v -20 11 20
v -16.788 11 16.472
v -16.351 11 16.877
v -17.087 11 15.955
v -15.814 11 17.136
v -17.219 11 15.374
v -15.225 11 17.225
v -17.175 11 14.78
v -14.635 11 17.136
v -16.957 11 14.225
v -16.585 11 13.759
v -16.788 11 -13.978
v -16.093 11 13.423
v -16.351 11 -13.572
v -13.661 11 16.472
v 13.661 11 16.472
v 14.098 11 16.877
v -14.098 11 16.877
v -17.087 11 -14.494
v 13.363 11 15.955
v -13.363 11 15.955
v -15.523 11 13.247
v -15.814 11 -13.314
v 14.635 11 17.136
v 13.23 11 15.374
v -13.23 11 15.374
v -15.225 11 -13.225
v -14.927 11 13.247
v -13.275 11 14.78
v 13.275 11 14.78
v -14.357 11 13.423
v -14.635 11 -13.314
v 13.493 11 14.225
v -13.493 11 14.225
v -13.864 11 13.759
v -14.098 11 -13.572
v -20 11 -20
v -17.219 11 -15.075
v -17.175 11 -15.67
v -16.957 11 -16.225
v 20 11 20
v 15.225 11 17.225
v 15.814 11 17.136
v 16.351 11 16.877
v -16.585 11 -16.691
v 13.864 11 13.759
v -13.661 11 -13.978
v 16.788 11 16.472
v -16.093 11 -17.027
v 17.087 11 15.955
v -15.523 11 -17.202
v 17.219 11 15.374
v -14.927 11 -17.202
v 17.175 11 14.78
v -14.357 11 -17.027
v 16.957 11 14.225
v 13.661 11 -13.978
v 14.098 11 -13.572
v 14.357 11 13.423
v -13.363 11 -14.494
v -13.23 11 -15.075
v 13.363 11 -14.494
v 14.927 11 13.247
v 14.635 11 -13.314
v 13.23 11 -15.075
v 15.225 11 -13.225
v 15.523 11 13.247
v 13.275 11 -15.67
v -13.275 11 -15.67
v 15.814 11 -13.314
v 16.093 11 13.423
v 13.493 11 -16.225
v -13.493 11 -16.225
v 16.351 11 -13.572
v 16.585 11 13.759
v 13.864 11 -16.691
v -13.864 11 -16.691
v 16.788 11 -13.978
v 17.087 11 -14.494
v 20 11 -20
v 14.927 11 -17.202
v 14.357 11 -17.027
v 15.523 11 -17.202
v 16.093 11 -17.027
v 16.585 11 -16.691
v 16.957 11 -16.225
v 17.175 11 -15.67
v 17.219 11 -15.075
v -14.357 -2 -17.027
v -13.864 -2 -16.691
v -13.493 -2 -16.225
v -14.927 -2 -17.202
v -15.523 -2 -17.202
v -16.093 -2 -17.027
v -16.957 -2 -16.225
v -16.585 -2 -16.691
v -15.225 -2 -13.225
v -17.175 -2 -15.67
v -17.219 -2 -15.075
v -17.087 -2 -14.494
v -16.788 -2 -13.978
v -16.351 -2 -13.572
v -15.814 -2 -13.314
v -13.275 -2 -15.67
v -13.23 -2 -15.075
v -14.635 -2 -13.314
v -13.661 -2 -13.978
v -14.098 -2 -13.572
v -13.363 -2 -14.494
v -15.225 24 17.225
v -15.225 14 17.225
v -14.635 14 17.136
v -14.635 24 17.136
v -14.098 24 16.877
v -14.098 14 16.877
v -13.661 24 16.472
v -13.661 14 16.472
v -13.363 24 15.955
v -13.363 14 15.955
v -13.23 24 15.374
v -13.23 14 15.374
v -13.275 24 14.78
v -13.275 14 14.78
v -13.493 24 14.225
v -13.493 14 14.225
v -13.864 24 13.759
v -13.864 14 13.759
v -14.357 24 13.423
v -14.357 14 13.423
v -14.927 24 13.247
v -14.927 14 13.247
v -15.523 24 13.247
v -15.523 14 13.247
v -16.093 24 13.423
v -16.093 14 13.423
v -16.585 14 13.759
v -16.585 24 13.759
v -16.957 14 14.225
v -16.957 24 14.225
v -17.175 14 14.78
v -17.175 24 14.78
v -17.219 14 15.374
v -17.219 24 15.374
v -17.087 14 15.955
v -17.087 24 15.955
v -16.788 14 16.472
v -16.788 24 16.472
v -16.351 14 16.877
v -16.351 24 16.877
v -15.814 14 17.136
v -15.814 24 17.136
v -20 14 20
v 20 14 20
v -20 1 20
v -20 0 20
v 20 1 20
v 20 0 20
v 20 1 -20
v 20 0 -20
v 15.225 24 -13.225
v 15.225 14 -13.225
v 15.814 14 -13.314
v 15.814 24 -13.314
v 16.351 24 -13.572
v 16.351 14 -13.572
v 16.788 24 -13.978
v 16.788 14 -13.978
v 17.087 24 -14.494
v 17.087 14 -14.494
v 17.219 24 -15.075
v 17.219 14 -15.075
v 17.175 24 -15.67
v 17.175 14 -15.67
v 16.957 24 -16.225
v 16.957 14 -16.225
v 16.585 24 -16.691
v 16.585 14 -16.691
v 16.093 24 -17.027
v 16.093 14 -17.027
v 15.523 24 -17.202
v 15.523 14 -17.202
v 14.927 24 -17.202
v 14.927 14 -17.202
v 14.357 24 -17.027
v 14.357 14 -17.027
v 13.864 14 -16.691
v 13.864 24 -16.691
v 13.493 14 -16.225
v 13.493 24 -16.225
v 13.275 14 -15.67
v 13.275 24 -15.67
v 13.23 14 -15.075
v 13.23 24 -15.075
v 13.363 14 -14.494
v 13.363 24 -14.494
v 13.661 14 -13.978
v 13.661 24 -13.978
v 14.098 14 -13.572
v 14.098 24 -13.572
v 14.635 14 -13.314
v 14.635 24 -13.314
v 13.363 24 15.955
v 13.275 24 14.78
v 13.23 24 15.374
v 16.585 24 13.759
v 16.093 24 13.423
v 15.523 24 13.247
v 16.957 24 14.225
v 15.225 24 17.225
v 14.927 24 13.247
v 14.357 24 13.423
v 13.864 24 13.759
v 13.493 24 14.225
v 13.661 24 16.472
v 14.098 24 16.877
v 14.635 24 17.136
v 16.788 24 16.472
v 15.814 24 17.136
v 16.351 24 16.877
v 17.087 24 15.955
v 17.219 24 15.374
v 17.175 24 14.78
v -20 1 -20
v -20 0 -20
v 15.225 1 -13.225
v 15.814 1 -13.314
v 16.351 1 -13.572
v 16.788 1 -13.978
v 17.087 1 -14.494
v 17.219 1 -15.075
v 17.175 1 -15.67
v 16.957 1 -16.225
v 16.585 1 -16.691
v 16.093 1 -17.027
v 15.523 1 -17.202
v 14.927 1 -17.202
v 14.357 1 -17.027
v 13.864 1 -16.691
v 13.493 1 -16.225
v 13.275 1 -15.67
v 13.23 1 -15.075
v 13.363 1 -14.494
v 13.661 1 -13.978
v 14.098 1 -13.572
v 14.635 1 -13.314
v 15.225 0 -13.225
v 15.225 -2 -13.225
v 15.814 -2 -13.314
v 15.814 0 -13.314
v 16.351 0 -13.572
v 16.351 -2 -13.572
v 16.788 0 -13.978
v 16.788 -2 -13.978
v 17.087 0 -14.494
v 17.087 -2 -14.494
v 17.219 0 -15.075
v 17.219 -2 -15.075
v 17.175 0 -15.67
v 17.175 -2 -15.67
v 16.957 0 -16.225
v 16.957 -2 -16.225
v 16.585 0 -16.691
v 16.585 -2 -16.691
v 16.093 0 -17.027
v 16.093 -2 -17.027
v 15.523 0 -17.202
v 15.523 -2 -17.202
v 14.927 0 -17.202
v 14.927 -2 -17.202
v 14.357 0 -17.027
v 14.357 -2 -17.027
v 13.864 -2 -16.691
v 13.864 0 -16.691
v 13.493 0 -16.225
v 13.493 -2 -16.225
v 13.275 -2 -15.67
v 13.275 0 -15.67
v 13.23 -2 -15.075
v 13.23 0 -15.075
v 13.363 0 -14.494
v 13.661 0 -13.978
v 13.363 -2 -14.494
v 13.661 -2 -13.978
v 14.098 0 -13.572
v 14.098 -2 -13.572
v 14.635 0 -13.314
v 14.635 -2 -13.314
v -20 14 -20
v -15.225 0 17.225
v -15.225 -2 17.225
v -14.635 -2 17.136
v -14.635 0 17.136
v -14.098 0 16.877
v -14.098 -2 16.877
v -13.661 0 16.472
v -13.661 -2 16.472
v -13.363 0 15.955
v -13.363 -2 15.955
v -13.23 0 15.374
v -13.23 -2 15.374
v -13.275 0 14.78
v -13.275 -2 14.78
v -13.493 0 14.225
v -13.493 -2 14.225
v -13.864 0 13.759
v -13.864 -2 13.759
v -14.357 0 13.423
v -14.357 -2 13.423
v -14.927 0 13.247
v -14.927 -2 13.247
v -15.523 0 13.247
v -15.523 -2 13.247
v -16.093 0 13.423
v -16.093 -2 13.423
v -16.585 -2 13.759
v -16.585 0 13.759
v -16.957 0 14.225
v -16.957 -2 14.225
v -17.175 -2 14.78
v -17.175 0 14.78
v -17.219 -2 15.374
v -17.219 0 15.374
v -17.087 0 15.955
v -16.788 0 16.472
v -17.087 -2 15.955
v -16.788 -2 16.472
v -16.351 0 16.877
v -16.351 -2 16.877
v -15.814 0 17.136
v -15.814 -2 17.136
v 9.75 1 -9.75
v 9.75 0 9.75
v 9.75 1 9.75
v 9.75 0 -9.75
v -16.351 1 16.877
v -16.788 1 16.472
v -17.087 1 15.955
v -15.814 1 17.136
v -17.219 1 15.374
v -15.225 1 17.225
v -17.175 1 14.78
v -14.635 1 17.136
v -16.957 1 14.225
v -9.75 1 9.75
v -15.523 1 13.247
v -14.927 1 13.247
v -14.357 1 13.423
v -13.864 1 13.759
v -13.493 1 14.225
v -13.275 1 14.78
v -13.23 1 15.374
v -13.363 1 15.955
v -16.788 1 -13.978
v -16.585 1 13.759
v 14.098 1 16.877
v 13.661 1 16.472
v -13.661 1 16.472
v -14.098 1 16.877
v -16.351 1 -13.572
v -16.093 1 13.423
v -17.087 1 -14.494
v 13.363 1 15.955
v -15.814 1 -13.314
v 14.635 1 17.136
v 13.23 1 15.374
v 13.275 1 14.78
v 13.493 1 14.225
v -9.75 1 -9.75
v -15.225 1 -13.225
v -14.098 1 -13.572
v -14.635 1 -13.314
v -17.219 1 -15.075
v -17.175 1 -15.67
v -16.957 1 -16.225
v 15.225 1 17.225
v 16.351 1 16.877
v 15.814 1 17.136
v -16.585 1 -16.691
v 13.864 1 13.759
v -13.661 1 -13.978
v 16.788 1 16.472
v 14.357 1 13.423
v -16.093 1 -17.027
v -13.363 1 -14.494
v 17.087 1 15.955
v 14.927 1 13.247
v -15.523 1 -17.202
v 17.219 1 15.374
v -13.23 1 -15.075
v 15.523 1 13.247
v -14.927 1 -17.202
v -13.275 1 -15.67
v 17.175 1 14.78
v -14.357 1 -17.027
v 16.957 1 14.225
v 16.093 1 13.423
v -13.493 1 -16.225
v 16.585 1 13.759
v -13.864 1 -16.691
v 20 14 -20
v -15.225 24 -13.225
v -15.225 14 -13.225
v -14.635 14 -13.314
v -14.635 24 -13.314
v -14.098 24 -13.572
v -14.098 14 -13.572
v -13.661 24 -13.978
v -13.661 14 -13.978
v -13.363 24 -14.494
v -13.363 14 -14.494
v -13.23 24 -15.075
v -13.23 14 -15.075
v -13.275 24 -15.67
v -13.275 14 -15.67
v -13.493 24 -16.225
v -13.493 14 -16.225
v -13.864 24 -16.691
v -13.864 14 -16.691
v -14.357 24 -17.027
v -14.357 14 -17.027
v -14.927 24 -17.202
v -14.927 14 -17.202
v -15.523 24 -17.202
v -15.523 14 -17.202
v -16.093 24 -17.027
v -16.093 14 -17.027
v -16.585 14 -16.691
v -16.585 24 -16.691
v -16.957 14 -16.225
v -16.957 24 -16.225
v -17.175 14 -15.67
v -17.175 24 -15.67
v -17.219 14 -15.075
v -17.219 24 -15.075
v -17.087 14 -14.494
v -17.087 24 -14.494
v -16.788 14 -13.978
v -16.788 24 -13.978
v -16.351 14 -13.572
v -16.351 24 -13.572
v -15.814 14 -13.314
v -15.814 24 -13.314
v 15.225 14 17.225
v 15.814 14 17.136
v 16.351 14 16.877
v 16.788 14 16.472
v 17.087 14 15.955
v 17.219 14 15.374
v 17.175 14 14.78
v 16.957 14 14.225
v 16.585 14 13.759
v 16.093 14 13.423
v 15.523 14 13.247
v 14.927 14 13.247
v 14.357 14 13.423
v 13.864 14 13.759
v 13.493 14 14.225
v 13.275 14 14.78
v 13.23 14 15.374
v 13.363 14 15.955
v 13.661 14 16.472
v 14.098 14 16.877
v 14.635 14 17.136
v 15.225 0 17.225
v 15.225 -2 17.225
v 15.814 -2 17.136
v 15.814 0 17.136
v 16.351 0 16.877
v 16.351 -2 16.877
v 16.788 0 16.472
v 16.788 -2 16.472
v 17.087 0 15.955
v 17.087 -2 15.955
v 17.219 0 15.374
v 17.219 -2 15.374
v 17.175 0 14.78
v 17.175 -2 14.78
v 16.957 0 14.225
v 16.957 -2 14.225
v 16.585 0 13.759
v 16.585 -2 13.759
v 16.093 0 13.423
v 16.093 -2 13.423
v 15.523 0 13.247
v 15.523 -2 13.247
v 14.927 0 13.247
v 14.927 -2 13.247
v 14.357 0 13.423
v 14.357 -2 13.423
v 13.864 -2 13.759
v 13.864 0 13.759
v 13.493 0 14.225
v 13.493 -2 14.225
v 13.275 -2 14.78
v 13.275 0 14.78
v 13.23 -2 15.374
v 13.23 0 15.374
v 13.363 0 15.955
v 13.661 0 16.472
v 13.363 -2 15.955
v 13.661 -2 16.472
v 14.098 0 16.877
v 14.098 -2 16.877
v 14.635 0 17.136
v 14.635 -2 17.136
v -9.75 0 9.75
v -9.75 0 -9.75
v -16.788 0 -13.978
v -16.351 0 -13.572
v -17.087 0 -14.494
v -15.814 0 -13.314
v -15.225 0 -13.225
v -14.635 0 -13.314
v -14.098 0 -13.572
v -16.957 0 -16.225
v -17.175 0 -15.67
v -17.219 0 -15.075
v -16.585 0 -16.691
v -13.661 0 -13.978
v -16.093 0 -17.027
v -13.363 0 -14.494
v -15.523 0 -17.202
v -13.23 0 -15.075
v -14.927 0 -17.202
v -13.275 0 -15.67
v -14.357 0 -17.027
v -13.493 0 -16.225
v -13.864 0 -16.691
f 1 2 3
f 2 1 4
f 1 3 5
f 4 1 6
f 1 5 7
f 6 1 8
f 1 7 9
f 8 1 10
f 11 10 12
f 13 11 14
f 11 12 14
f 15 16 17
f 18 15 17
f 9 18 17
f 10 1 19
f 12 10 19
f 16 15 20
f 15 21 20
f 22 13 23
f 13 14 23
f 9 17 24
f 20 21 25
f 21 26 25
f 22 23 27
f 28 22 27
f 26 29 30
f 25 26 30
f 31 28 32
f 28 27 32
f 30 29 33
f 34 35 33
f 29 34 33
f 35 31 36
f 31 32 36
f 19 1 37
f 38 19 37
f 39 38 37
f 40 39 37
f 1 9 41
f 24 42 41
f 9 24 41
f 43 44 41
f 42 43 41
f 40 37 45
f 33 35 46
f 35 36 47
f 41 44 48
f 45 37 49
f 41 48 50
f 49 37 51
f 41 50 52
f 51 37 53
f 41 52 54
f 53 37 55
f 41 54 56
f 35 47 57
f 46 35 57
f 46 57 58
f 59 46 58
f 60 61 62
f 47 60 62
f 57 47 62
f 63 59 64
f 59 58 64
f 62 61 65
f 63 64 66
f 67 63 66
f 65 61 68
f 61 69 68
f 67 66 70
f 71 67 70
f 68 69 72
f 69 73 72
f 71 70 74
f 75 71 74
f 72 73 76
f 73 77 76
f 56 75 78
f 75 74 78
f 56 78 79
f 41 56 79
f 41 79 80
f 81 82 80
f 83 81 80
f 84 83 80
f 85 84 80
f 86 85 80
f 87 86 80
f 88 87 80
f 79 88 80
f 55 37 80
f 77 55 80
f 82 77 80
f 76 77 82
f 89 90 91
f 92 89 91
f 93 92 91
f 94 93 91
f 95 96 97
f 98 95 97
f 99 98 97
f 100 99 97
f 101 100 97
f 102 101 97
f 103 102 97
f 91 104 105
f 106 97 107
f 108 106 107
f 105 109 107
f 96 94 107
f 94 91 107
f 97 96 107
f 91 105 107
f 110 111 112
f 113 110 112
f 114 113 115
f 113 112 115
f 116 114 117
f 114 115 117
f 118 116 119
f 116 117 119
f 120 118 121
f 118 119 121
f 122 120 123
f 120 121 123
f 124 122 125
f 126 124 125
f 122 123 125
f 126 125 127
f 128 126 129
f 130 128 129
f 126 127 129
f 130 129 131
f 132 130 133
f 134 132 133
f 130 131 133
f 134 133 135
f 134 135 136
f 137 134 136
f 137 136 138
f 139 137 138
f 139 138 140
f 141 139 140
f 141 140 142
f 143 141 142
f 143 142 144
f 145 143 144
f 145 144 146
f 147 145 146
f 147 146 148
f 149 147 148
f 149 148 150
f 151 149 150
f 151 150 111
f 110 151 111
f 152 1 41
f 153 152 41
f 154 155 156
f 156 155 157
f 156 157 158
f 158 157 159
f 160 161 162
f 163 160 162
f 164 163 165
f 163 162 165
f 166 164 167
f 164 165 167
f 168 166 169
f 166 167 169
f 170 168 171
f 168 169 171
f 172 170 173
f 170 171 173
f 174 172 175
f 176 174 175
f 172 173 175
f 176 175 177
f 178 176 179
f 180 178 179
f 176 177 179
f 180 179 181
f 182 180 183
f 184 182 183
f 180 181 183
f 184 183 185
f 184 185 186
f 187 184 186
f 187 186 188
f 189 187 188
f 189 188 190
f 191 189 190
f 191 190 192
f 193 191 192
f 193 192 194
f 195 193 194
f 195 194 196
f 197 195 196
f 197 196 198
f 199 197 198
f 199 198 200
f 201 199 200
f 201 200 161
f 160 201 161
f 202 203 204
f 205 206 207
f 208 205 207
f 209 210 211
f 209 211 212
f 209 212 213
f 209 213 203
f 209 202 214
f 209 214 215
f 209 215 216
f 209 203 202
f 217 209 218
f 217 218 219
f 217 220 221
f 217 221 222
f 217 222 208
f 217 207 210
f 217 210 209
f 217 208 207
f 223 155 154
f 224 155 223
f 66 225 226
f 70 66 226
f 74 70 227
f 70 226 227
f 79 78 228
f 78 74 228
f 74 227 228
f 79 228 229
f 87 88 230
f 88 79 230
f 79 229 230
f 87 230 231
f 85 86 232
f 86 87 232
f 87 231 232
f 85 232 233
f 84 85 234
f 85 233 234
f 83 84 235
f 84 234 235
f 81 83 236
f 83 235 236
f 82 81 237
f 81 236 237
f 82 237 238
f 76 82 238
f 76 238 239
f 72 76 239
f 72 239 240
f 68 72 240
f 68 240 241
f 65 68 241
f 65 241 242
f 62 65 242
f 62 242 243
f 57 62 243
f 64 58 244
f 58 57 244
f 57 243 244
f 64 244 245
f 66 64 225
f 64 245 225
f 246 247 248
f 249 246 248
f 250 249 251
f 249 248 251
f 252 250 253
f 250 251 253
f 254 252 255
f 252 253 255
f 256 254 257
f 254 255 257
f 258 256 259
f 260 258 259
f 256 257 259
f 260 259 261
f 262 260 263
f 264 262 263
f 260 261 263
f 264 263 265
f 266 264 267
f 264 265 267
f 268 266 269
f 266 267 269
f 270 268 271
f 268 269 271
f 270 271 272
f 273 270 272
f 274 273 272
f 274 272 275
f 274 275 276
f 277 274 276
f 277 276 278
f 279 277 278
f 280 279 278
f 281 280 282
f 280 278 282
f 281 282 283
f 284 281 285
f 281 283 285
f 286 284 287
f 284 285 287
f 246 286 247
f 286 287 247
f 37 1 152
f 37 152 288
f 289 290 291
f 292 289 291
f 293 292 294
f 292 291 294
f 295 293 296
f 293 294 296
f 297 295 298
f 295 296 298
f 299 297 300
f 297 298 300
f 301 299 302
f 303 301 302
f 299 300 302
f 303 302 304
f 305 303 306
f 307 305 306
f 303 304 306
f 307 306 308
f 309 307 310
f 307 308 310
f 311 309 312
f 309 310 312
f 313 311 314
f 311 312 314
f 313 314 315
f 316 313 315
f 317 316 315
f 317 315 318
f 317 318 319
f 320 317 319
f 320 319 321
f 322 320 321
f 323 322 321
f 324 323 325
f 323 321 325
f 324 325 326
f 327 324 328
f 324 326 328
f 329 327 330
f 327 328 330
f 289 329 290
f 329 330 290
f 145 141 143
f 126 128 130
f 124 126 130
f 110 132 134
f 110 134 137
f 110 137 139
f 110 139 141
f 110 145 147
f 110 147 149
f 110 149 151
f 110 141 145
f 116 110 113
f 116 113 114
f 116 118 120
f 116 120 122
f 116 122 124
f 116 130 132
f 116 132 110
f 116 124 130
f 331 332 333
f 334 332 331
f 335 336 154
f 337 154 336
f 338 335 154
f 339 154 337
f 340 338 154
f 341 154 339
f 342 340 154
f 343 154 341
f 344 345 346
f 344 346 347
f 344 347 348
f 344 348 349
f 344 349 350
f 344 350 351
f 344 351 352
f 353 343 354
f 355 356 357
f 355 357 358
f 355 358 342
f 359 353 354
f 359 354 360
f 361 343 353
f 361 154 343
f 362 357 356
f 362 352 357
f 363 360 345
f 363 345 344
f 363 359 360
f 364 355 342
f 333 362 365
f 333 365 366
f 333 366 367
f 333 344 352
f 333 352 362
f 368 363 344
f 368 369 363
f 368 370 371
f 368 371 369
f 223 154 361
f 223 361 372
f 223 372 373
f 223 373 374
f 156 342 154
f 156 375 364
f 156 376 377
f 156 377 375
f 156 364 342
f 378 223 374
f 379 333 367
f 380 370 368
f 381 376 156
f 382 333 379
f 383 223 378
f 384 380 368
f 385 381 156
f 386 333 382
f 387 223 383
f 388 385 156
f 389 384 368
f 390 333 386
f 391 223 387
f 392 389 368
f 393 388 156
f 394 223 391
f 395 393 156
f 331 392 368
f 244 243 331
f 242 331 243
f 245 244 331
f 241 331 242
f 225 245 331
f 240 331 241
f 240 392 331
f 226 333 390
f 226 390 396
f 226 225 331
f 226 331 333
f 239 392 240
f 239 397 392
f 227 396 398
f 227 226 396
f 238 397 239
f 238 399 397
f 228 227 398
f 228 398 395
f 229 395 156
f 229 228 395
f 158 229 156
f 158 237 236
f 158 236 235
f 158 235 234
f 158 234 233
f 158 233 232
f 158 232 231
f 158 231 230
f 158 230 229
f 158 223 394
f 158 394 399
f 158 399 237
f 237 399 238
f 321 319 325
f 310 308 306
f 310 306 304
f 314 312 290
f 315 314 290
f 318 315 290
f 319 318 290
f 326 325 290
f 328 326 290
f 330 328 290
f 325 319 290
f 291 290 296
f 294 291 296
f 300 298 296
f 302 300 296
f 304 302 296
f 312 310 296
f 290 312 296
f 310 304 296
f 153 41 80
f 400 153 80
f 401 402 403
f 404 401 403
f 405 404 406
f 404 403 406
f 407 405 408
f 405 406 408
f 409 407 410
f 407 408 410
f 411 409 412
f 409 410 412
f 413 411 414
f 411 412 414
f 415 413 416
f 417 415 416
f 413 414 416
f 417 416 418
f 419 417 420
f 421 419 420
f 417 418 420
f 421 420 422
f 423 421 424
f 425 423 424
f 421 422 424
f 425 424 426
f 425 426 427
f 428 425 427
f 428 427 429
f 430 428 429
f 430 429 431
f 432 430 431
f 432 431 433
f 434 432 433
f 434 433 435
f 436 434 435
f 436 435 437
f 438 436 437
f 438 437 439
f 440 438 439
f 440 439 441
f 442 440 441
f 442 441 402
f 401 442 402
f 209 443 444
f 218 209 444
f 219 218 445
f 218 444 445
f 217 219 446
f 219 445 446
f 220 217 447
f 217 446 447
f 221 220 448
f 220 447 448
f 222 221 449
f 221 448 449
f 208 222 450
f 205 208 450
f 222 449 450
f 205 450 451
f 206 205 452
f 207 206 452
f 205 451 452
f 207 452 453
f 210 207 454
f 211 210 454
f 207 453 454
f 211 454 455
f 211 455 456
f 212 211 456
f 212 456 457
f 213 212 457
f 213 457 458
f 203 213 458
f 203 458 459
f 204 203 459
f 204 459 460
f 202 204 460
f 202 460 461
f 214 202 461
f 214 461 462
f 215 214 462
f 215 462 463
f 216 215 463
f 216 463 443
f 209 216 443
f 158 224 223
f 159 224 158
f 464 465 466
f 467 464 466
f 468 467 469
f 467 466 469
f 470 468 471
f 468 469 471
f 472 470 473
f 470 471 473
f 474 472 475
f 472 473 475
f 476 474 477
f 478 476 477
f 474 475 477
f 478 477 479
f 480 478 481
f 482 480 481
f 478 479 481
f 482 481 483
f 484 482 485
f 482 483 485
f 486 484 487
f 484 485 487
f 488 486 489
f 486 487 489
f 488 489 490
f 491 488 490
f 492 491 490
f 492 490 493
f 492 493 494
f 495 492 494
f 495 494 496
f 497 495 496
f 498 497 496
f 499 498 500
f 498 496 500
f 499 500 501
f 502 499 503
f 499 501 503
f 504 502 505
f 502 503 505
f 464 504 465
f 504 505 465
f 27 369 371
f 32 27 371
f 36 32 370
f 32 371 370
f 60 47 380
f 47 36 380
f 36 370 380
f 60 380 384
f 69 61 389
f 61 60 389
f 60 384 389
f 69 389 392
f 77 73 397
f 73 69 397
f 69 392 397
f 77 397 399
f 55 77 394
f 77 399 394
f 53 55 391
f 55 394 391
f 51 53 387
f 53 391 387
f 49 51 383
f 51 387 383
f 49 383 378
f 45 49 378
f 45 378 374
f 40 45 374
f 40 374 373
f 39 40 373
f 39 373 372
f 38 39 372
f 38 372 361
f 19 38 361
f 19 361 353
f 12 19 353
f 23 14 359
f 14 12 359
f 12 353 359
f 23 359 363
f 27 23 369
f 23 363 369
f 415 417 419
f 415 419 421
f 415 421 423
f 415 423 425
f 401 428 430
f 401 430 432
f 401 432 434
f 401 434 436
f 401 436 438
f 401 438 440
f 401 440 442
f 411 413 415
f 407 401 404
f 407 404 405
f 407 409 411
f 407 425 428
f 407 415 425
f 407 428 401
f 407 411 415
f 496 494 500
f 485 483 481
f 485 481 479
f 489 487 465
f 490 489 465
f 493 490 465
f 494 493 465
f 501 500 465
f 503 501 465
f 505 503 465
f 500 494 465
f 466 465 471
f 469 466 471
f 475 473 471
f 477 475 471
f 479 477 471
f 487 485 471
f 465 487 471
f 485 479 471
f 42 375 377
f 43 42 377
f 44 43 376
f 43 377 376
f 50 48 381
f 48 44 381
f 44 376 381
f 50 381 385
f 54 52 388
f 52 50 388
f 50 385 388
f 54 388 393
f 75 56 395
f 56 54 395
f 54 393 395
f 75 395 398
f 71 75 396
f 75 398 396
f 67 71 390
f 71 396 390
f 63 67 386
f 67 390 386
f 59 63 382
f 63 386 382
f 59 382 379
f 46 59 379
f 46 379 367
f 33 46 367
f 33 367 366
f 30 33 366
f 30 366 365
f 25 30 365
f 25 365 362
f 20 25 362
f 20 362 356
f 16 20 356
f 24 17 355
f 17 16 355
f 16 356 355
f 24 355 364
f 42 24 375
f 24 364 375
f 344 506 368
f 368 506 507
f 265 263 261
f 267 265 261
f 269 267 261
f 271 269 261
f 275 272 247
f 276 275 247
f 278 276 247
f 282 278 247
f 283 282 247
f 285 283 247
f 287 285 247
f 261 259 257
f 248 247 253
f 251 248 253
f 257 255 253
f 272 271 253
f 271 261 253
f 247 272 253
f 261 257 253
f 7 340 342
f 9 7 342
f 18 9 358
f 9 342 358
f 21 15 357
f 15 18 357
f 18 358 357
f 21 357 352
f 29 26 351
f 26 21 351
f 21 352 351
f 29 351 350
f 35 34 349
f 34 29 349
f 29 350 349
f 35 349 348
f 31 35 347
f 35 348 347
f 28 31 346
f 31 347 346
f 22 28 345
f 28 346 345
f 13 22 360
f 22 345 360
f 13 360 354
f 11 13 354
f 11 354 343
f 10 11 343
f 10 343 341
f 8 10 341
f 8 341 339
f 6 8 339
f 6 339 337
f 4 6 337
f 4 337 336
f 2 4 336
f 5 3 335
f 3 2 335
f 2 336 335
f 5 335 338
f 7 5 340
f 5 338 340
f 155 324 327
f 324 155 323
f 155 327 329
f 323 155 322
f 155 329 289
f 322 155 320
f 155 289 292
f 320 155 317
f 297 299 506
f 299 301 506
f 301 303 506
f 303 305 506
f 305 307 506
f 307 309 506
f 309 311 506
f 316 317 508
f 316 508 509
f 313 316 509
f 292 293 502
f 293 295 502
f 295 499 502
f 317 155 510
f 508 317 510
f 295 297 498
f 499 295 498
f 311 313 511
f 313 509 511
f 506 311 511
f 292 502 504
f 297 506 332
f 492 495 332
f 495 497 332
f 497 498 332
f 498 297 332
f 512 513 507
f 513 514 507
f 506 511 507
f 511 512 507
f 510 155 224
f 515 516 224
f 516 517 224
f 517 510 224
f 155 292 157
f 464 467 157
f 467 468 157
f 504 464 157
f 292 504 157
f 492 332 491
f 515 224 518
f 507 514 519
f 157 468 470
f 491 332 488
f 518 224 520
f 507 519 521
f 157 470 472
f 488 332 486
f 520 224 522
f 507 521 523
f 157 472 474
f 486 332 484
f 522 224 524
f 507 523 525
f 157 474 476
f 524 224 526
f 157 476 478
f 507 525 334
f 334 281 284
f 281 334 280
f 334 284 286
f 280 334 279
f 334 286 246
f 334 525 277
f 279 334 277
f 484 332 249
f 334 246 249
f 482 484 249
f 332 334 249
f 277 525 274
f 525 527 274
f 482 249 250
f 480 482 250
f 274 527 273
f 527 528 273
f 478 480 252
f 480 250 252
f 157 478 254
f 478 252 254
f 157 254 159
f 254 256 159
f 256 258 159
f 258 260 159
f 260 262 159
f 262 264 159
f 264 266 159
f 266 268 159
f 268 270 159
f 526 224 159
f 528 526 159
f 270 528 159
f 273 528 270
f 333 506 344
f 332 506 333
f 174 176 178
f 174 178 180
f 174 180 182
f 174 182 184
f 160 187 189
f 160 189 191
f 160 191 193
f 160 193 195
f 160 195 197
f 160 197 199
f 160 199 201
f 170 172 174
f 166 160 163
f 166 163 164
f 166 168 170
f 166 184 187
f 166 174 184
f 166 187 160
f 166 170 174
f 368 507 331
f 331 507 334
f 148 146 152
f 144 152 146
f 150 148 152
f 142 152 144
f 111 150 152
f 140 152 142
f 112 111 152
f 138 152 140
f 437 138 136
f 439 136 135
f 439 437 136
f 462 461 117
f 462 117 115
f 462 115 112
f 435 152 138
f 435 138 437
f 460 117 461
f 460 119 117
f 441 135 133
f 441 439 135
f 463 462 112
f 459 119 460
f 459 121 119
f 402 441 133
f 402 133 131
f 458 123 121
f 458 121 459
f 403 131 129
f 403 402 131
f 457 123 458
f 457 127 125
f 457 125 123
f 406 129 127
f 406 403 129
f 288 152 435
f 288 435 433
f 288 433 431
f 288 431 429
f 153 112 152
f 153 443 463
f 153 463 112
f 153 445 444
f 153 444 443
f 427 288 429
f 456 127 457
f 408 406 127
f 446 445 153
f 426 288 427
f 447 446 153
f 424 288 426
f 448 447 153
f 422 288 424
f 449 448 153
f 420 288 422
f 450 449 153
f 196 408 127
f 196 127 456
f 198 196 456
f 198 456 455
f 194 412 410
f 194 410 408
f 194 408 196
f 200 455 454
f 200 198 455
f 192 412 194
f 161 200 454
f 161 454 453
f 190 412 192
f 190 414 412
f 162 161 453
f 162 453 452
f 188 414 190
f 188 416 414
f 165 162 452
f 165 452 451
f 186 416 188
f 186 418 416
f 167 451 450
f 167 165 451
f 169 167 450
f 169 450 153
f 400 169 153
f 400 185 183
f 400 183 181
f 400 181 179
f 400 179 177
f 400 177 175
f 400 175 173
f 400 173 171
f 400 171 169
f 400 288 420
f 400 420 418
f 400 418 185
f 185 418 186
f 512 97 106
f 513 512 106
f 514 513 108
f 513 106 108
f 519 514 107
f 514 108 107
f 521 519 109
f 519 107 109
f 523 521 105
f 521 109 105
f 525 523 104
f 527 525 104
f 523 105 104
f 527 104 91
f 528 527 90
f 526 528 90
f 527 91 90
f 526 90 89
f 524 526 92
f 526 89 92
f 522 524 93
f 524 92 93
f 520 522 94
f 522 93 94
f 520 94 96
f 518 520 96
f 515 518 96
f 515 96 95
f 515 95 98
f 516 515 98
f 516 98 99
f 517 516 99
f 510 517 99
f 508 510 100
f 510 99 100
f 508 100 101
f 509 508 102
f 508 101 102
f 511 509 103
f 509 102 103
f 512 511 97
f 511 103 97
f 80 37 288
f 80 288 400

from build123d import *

# Parameters (mm, degrees)
SKETCH_2_W          = 40
SKETCH_2_H          = 40
EXTRUDE_2_DEPTH     = 1
SKETCH_3_R          = 2
CUT_EXTRUDE_1_DEPTH = 3
EXTRUDE_START       = 10
SKETCH_9_W          = 40
SKETCH_9_H          = 40
EXTRUDE_4_DEPTH     = 3
SKETCH_3_3_R        = 2
EXTRUDE_5_DEPTH     = 24
EXTRUDE_START_2     = -2
SKETCH_2_8_R        = 2
EXTRUDE_6_DEPTH     = 2
SKETCH_2_9_W        = 19.5
SKETCH_2_9_H        = 19.5
CUT_EXTRUDE_2_DEPTH = 10


with BuildPart() as part:
    # 草图2 → 凸台-拉伸2 (new body)
    with BuildSketch(Plane(origin=(0, 0, 0), x_dir=(1, 0, 0), z_dir=(0, 1, 0))):
        Rectangle(SKETCH_2_W, SKETCH_2_H)
    extrude(amount=EXTRUDE_2_DEPTH)

    # 草图3 → 切除-拉伸1 (cut)
    with BuildSketch(Plane(origin=(0, 0, 0), x_dir=(1, 0, 0), z_dir=(0, 1, 0))):
        with Locations((-15.224798987, -15.224798987)):
            Circle(SKETCH_3_R)
        with Locations((15.224798987, -15.224798987)):
            Circle(SKETCH_3_R)
        with Locations((15.224798987, 15.224798987)):
            Circle(SKETCH_3_R)
        with Locations((-15.224798987, 15.224798987)):
            Circle(SKETCH_3_R)
    extrude(amount=CUT_EXTRUDE_1_DEPTH, mode=Mode.SUBTRACT)



with BuildPart() as body_2:
    # 草图9 → 凸台-拉伸4 (new body)
    with BuildSketch(Plane(origin=(0, 1, 0), x_dir=(1, 0, 0), z_dir=(0, 1, 0)).offset(EXTRUDE_START)):
        Rectangle(SKETCH_9_W, SKETCH_9_H)
    extrude(amount=EXTRUDE_4_DEPTH)

    # 草图3<3> → 凸台-拉伸5 (add)
    with BuildSketch(Plane(origin=(0, 0, 0), x_dir=(1, 0, 0), z_dir=(0, 1, 0))):
        with Locations((-15.224798987, -15.224798987)):
            Circle(SKETCH_3_3_R)
        with Locations((15.224798987, -15.224798987)):
            Circle(SKETCH_3_3_R)
        with Locations((15.224798987, 15.224798987)):
            Circle(SKETCH_3_3_R)
        with Locations((-15.224798987, 15.224798987)):
            Circle(SKETCH_3_3_R)
    extrude(amount=EXTRUDE_5_DEPTH)


with BuildPart() as part_1:
    add(part.part)

    add(body_2.part)  # 凸台-拉伸6 merges body 2
    # 草图2<8> → 凸台-拉伸6 (add)
    with BuildSketch(Plane(origin=(0, 0, 0), x_dir=(1, 0, 0), z_dir=(0, 1, 0)).offset(EXTRUDE_START_2)):
        with Locations((15.224798987, 15.224798987)):
            Circle(SKETCH_2_8_R)
        with Locations((-15.224798987, -15.224798987)):
            Circle(SKETCH_2_8_R)
        with Locations((15.224798987, -15.224798987)):
            Circle(SKETCH_2_8_R)
        with Locations((-15.224798987, 15.224798987)):
            Circle(SKETCH_2_8_R)
    extrude(amount=EXTRUDE_6_DEPTH)

    # 草图2<9> → 切除-拉伸2 (cut)
    with BuildSketch(Plane(origin=(0, 0, 0), x_dir=(1, 0, 0), z_dir=(0, 1, 0))):
        Rectangle(SKETCH_2_9_W, SKETCH_2_9_H)
    extrude(amount=CUT_EXTRUDE_2_DEPTH, mode=Mode.SUBTRACT)


solid = part_1.part
